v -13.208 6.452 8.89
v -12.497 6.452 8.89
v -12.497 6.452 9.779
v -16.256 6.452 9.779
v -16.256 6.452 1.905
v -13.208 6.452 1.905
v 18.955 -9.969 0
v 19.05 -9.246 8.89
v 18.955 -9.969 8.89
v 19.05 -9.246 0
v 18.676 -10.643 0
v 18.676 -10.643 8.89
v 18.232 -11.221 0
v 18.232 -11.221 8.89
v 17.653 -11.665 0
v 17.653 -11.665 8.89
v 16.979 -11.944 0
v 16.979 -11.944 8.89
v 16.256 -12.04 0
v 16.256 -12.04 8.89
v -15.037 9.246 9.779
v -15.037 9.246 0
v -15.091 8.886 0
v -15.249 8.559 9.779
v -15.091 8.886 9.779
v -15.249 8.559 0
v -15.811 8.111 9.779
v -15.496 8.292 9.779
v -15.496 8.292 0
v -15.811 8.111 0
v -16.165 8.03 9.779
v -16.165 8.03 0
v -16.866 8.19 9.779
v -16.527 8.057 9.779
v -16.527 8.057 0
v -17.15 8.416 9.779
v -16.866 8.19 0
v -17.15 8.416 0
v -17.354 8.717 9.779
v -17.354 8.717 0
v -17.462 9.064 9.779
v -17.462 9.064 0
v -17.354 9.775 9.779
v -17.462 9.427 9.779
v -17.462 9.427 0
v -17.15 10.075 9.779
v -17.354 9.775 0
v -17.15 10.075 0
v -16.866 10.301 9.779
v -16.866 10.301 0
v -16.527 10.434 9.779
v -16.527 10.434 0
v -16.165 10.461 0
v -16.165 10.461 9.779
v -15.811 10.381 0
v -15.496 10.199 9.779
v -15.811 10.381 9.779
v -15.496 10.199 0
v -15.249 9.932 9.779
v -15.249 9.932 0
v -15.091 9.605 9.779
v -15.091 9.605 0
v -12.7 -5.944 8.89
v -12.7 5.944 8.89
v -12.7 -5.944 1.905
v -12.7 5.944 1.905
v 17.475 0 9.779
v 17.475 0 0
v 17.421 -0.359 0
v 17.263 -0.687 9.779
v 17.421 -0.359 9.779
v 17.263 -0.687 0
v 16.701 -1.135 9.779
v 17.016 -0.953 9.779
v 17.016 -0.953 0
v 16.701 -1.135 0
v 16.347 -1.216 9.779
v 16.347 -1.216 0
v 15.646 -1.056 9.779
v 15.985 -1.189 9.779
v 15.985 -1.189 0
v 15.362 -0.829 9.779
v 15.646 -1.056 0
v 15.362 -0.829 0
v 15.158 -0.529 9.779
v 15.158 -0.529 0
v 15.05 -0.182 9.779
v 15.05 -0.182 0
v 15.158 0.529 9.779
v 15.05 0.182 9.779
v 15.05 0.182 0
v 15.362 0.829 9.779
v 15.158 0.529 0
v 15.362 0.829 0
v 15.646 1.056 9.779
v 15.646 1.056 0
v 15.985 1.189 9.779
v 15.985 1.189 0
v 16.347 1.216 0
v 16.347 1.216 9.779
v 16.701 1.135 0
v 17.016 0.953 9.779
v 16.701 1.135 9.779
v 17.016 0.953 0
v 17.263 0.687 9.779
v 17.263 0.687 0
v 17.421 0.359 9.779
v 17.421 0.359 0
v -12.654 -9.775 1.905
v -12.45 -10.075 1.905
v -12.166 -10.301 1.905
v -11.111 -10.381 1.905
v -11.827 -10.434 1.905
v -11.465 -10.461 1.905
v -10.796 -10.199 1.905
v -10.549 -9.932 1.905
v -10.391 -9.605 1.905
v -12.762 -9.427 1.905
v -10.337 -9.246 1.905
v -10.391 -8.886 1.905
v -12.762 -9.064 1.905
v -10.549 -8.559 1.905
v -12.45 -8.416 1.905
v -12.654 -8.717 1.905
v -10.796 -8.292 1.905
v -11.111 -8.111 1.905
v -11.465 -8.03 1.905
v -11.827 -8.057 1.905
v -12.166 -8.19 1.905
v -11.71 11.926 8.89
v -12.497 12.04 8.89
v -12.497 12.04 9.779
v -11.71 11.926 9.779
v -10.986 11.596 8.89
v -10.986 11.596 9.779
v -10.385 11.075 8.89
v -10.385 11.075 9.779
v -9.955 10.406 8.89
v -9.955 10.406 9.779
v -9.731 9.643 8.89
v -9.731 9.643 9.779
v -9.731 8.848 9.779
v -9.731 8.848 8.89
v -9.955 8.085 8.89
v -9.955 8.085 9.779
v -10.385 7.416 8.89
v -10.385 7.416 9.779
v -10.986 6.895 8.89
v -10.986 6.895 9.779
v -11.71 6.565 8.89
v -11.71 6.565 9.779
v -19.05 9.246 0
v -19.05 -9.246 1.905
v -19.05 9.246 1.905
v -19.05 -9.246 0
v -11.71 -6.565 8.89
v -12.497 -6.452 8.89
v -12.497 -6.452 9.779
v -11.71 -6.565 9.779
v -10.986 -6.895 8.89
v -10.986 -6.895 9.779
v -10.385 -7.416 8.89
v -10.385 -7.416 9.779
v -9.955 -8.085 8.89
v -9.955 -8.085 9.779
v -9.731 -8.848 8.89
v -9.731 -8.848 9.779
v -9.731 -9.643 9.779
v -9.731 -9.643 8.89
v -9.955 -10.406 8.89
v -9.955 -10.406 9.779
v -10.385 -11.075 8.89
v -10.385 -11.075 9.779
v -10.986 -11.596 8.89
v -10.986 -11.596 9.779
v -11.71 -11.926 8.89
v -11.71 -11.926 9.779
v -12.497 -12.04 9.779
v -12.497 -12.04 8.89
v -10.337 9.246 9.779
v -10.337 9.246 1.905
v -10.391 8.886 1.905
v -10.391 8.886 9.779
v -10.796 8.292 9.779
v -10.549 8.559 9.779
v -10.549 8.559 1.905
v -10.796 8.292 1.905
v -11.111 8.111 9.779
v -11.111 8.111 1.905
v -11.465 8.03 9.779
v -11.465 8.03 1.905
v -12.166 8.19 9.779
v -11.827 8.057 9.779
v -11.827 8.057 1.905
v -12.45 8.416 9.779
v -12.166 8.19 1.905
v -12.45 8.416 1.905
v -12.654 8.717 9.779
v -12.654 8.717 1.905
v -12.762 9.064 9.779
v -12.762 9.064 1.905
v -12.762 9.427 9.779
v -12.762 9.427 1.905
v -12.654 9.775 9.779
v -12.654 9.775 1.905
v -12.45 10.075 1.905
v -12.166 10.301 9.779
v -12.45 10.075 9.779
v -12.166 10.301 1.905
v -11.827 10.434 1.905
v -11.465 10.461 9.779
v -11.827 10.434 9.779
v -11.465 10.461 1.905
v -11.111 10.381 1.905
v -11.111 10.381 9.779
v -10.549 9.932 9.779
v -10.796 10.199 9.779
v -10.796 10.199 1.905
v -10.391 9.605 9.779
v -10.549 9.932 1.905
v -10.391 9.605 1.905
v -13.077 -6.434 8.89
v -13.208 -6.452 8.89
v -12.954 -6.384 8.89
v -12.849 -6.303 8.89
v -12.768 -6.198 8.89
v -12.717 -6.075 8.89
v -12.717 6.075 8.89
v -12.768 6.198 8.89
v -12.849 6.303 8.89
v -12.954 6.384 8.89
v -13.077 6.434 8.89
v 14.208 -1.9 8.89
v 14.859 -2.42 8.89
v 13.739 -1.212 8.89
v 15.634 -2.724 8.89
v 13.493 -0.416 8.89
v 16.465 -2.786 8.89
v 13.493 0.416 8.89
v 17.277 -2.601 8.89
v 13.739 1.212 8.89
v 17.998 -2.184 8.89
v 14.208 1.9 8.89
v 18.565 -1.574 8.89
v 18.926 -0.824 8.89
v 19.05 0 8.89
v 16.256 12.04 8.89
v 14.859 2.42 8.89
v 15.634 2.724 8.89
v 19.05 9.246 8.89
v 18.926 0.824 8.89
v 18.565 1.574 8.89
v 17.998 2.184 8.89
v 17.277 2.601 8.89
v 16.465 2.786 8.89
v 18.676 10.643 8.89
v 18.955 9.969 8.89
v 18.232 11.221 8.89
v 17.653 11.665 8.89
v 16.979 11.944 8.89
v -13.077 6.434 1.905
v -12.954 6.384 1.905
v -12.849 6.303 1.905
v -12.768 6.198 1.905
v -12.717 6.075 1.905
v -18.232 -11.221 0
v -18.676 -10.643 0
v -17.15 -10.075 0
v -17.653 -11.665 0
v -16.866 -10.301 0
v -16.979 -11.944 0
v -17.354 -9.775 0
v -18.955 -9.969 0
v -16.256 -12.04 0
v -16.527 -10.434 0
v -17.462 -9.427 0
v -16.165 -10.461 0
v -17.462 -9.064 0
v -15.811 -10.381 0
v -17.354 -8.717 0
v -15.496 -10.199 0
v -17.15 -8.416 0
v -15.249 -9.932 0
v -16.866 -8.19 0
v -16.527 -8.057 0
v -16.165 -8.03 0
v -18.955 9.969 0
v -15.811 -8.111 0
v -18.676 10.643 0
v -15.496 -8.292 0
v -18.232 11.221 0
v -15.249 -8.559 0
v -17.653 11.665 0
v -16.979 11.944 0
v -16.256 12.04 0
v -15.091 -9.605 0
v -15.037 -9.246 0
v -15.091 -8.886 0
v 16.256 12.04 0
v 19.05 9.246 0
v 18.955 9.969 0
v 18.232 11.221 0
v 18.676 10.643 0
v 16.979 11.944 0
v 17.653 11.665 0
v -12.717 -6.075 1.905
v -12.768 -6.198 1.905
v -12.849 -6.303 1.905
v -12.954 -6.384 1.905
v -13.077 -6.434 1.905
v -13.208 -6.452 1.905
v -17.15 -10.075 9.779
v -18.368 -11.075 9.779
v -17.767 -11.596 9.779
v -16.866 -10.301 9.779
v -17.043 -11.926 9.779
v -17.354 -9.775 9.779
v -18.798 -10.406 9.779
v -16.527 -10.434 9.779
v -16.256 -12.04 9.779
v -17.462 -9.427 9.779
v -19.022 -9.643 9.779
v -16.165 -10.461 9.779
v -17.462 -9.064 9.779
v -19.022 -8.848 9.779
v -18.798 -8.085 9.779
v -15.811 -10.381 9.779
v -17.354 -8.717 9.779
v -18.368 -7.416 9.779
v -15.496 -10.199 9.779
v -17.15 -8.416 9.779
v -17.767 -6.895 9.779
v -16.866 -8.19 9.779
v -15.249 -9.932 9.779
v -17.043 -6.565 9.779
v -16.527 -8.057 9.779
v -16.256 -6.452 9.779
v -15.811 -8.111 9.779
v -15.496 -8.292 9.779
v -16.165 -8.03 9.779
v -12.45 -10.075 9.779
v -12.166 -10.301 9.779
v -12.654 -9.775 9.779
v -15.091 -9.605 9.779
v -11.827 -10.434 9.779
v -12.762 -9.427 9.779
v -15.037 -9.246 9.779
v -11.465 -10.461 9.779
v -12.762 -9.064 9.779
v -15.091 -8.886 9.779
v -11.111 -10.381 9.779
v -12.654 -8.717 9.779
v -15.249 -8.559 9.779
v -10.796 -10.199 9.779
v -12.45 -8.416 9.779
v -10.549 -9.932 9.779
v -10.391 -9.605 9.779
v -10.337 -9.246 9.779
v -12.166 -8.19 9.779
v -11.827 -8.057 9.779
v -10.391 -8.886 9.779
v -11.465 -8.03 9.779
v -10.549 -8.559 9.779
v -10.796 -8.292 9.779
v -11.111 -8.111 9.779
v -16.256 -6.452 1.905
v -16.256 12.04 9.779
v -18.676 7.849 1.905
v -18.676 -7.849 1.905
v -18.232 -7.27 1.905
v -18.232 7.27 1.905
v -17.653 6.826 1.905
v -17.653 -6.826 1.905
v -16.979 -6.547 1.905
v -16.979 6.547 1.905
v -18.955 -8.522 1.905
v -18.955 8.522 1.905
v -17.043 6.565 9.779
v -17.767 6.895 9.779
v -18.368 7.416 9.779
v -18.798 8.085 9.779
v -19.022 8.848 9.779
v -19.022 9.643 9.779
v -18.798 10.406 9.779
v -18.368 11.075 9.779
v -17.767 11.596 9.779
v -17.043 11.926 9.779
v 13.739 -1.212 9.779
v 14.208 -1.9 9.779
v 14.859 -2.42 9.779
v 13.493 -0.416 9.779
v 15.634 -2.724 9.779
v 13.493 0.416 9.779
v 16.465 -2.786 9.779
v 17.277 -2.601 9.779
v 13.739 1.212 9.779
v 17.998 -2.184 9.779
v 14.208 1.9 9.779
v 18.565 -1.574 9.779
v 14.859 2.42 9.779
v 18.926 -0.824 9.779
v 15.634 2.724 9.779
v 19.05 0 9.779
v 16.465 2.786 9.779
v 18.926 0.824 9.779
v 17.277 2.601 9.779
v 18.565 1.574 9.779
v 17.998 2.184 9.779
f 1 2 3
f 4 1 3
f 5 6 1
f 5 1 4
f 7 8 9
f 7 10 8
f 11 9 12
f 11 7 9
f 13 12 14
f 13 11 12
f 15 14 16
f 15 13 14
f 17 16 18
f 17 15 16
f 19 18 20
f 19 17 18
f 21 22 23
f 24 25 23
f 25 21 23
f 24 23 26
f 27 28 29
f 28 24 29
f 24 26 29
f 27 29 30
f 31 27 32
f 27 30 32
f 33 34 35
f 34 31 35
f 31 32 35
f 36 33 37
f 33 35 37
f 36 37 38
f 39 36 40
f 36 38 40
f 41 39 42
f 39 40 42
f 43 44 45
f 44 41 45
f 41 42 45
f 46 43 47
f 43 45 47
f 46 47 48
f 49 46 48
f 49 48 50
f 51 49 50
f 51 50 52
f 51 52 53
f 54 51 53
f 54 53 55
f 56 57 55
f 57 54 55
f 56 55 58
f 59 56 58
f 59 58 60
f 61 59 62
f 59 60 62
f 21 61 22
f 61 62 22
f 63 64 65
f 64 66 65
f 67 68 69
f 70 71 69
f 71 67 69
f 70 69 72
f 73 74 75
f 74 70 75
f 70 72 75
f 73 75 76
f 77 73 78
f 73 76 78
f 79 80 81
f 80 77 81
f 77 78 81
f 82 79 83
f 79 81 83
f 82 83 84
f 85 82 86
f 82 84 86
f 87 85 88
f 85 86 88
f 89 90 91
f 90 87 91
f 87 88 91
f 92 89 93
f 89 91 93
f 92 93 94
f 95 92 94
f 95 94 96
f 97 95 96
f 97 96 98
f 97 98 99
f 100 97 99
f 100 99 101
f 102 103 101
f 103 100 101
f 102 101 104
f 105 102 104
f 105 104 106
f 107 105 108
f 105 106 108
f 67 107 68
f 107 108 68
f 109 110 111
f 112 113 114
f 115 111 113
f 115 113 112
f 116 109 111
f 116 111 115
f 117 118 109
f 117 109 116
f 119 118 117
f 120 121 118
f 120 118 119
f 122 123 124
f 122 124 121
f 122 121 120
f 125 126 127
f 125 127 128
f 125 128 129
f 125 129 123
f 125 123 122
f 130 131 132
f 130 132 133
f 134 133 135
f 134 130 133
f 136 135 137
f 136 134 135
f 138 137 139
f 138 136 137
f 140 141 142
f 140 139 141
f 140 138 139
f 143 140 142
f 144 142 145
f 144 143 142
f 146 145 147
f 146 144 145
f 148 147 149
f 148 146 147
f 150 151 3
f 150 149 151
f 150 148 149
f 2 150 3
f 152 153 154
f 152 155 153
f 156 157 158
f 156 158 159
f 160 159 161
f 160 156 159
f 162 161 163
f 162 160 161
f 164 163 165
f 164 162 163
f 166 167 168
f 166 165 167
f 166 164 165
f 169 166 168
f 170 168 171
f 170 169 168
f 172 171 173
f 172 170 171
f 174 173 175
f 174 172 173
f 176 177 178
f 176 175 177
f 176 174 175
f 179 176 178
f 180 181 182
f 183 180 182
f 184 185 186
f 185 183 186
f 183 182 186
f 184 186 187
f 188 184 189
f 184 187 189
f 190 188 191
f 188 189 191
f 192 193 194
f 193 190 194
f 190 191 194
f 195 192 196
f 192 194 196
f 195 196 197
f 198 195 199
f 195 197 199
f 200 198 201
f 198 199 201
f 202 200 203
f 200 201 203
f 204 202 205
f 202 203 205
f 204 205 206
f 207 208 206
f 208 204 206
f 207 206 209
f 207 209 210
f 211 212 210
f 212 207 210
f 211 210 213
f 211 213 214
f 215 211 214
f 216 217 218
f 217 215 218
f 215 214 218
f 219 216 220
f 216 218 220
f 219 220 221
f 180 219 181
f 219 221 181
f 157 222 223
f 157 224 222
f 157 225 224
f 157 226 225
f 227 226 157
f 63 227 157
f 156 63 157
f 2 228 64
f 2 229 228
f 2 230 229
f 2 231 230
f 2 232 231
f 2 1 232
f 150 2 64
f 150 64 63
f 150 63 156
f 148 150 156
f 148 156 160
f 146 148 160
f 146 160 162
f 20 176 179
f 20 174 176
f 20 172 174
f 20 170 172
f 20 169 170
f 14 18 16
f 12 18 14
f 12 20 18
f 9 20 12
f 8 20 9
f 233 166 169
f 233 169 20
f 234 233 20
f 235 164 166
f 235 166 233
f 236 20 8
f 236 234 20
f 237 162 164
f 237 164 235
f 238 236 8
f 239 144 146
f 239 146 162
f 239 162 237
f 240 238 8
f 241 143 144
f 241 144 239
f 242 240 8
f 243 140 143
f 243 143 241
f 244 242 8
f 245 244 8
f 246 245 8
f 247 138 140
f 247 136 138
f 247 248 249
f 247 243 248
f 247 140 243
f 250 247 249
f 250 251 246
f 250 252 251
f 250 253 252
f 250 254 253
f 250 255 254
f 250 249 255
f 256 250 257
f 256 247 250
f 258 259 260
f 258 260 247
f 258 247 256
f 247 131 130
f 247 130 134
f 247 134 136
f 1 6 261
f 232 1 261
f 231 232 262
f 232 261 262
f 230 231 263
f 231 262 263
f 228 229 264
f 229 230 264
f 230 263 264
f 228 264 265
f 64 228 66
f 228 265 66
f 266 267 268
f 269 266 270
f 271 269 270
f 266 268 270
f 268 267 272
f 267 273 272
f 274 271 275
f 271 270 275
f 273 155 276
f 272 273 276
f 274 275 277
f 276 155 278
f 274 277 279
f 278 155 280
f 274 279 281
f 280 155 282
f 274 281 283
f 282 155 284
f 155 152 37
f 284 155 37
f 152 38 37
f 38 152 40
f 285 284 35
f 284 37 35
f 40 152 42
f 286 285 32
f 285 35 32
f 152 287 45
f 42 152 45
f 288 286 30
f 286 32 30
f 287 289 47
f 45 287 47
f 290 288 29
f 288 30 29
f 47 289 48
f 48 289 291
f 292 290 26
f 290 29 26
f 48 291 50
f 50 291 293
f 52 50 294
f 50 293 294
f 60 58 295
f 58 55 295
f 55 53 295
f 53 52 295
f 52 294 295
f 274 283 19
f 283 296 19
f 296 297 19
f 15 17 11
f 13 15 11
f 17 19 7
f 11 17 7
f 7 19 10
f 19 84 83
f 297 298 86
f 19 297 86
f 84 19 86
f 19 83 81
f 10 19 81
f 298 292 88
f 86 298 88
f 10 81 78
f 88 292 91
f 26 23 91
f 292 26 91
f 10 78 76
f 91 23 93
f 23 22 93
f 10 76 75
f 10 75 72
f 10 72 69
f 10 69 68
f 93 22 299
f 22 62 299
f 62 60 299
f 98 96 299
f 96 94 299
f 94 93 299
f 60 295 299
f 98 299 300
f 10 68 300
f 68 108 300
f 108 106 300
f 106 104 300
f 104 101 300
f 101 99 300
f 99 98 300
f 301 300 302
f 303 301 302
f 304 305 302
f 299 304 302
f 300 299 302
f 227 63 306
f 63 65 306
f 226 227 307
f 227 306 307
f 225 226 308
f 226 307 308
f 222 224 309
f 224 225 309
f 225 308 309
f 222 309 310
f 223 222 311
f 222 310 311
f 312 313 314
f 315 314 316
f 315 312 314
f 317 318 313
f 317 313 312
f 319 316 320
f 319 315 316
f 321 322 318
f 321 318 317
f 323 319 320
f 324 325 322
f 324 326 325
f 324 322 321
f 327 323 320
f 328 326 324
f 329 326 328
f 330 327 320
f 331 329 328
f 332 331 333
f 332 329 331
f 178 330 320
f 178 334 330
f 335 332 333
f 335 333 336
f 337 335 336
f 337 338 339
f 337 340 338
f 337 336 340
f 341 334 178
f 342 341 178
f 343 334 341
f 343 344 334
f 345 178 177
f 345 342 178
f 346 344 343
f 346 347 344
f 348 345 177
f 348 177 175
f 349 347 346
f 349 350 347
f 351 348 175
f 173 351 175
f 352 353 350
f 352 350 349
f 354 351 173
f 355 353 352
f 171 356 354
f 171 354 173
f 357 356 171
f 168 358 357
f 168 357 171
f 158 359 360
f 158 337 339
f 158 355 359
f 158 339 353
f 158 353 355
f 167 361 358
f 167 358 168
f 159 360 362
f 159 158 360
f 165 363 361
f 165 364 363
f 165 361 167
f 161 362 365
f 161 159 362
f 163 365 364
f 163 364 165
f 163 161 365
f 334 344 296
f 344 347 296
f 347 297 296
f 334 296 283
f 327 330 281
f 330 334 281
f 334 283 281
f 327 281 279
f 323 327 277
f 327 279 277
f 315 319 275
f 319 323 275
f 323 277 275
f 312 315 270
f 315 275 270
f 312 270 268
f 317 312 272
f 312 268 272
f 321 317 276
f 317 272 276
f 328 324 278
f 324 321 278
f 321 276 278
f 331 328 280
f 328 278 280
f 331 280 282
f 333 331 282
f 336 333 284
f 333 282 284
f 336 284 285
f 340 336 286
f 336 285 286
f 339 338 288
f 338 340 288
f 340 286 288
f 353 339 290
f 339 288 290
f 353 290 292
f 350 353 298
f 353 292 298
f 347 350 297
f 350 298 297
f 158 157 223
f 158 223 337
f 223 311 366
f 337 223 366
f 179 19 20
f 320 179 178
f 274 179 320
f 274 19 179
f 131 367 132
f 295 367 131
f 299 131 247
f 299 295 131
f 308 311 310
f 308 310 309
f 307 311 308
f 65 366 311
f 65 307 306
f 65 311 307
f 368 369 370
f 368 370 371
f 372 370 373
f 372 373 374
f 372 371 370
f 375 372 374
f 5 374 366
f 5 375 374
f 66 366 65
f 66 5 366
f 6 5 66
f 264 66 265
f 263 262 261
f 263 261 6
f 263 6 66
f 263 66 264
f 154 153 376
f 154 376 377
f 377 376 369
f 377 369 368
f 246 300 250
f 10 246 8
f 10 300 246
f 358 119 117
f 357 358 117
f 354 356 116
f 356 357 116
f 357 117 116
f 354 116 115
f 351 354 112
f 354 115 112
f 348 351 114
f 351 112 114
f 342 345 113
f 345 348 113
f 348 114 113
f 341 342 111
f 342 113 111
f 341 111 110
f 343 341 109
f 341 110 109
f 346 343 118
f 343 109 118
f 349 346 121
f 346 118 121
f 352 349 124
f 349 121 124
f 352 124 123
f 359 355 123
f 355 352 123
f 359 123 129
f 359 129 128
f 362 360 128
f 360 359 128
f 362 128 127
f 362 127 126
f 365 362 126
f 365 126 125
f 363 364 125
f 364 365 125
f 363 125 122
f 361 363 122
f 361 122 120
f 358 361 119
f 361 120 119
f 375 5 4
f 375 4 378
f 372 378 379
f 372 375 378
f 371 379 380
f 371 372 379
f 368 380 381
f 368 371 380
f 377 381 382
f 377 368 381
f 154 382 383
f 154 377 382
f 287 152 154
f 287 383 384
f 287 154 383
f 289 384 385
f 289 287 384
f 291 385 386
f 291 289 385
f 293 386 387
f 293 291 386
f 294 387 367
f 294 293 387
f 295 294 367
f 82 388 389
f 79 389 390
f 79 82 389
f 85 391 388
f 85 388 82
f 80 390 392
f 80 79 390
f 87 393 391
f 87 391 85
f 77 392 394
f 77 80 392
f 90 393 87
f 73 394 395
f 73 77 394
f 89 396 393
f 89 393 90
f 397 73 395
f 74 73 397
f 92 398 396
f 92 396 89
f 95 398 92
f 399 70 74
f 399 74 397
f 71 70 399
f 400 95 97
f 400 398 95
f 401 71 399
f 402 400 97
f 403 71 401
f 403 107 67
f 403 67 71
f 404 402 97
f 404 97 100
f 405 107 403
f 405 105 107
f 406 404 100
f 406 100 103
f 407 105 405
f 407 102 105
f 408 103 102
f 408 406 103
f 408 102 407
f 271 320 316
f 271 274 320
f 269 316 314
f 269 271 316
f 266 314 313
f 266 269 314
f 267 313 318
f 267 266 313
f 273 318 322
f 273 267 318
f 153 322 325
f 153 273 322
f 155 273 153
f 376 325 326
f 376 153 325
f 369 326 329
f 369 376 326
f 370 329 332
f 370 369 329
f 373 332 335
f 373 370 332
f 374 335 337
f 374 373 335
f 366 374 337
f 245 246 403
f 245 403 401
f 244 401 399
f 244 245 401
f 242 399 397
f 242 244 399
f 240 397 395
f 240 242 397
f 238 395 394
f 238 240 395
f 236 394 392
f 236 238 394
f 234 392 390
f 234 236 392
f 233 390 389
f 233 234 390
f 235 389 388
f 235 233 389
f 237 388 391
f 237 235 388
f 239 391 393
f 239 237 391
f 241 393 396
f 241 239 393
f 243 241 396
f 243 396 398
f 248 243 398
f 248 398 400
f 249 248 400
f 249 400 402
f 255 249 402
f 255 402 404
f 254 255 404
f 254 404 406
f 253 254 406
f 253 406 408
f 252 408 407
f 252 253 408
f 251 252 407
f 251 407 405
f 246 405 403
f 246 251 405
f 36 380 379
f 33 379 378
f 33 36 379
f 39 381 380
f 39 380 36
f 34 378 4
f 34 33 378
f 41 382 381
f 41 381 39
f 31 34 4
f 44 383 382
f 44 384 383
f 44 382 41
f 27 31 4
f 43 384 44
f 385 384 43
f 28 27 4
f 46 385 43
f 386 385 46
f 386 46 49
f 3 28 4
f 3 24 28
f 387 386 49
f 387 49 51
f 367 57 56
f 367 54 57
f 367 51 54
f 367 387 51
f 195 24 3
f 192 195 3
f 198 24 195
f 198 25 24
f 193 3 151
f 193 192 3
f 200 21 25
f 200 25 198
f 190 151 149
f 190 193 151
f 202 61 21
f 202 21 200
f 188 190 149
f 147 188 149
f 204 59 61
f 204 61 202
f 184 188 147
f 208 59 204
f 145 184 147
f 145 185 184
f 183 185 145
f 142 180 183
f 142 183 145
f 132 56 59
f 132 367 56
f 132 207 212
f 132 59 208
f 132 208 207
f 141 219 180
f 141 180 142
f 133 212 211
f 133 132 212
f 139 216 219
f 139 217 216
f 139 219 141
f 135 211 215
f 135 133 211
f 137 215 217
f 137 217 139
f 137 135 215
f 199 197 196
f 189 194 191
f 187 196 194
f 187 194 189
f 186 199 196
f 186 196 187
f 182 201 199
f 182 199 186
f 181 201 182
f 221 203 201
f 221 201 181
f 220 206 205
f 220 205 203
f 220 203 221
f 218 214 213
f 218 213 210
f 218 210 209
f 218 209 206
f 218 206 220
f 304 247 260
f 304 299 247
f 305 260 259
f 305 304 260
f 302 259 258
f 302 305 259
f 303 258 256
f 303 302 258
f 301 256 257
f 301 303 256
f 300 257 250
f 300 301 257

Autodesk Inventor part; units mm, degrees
ref_plane "YZ Plane" through (0, 0, 0) normal (1, 0, 0) x (0, 1, 0)
ref_plane "XZ Plane" through (0, 0, 0) normal (0, 1, 0) x (-1, 0, 0)
ref_plane "XY Plane" through (0, 0, 0) normal (0, 0, 1) x (1, 0, 0)
sketch "Sketch1" plane through (0, 0, 0) normal (0, 0, 1) x (1, 0, 0)
  line L0 (-27.4801, 0) -> (27.4801, 0) construction
  line L1 (0, -17.6656) -> (0, 17.6656) construction
  line L2 (-16.256, 12.0396) -> (16.256, 12.0396)
  line L3 (19.05, 9.2456) -> (19.05, -9.2456)
  line L4 (16.256, -12.0396) -> (-16.256, -12.0396)
  line L5 (-19.05, -9.2456) -> (-19.05, 9.2456)
  line L6 (-16.256, 9.2456) -> (-16.256, -9.2456) construction
  circle A0 centre (-16.256, 9.2456) radius 1.2192
  circle A1 centre (-16.256, -9.2456) radius 1.2192
  circle A2 centre (16.256, 0) radius 1.2192
  arc A3 (-16.256, 12.0396) -> (-19.05, 9.2456) centre (-16.256, 9.2456) ccw
  arc A4 (-19.05, -9.2456) -> (-16.256, -12.0396) centre (-16.256, -9.2456) ccw
  arc A5 (16.256, -12.0396) -> (19.05, -9.2456) centre (16.256, -9.2456) ccw
  arc A6 (19.05, 9.2456) -> (16.256, 12.0396) centre (16.256, 9.2456) ccw
  line L7 (-16.256, 9.2456) -> (-12.4968, 9.2456) construction
  line L8 (-12.4968, 6.4516) -> (-16.256, 6.4516)
  arc A7 (-16.256, 12.0396) -> (-16.256, 6.4516) centre (-16.256, 9.2456) ccw
  arc A8 (-12.4968, 6.4516) -> (-12.4968, 12.0396) centre (-12.4968, 9.2456) ccw
  line L9 (-16.256, -9.2456) -> (-12.4968, -9.2456) construction
  line L10 (-12.4968, -6.4516) -> (-16.256, -6.4516)
  arc A9 (-16.256, -6.4516) -> (-19.05, -9.2456) centre (-16.256, -9.2456) ccw
  arc A10 (-12.4968, -12.0396) -> (-12.4968, -6.4516) centre (-12.4968, -9.2456) ccw
  circle A11 centre (-11.556, 9.2456) radius 1.2192
  circle A12 centre (-11.556, -9.2456) radius 1.2192
  line L11 (-11.556, 9.2456) -> (-11.556, -9.2456) construction
  line L12 (-12.7, 5.9436) -> (-12.7, -5.9436)
  arc A13 (-12.7, 5.9436) -> (-13.208, 6.4516) centre (-13.208, 5.9436) ccw
  arc A14 (-13.208, -6.4516) -> (-12.7, -5.9436) centre (-13.208, -5.9436) ccw
  circle A15 centre (16.256, 0) radius 2.794
  point P0 (0, 0)
  point P1 (19.05, -12.0396)
  point P2 (19.05, 12.0396)
  point P3 (-19.05, -12.0396)
  point P4 (-14.3764, 9.2456)
  point P5 (-14.3764, -9.2456)
  dimension "d0" = 38.1
  dimension "d1" = 24.0792
  dimension "d2" = 18.4912
  dimension "d3" = 2.4384
  dimension "d4" = 32.512
  dimension "d7" = 3.7592
  dimension "d8" = 4.7
  dimension "d9" = 6.35
  dimension "d12" = 0.508
extrude "Extrusion1" add sketch "Sketch1" along normal blind 1.905 contours L2 A8 L8 A7 A3 | A15 | L2 A6 L3 A5 L4 A10 L10 A14 L12 A13 L8 A8 | A7 L8 A13 L12 A14 L10 A9 L5 | A9 L10 A10 L4 A4 | A11 | A12
extrude "Extrusion2" add sketch "Sketch1" along normal blind 6.985 from surface at 1.905 contours L2 A8 L8 A7 A3 | A15 | L2 A6 L3 A5 L4 A10 L10 A14 L12 A13 L8 A8 | A9 L10 A10 L4 A4
extrude "Extrusion3" add sketch "Sketch1" along normal blind 0.889 from surface at 8.89 contours L2 A8 L8 A7 A3 | A15 | A9 L10 A10 L4 A4
properties part number "Lord Microstrain 3DM-CX5 OEM"
